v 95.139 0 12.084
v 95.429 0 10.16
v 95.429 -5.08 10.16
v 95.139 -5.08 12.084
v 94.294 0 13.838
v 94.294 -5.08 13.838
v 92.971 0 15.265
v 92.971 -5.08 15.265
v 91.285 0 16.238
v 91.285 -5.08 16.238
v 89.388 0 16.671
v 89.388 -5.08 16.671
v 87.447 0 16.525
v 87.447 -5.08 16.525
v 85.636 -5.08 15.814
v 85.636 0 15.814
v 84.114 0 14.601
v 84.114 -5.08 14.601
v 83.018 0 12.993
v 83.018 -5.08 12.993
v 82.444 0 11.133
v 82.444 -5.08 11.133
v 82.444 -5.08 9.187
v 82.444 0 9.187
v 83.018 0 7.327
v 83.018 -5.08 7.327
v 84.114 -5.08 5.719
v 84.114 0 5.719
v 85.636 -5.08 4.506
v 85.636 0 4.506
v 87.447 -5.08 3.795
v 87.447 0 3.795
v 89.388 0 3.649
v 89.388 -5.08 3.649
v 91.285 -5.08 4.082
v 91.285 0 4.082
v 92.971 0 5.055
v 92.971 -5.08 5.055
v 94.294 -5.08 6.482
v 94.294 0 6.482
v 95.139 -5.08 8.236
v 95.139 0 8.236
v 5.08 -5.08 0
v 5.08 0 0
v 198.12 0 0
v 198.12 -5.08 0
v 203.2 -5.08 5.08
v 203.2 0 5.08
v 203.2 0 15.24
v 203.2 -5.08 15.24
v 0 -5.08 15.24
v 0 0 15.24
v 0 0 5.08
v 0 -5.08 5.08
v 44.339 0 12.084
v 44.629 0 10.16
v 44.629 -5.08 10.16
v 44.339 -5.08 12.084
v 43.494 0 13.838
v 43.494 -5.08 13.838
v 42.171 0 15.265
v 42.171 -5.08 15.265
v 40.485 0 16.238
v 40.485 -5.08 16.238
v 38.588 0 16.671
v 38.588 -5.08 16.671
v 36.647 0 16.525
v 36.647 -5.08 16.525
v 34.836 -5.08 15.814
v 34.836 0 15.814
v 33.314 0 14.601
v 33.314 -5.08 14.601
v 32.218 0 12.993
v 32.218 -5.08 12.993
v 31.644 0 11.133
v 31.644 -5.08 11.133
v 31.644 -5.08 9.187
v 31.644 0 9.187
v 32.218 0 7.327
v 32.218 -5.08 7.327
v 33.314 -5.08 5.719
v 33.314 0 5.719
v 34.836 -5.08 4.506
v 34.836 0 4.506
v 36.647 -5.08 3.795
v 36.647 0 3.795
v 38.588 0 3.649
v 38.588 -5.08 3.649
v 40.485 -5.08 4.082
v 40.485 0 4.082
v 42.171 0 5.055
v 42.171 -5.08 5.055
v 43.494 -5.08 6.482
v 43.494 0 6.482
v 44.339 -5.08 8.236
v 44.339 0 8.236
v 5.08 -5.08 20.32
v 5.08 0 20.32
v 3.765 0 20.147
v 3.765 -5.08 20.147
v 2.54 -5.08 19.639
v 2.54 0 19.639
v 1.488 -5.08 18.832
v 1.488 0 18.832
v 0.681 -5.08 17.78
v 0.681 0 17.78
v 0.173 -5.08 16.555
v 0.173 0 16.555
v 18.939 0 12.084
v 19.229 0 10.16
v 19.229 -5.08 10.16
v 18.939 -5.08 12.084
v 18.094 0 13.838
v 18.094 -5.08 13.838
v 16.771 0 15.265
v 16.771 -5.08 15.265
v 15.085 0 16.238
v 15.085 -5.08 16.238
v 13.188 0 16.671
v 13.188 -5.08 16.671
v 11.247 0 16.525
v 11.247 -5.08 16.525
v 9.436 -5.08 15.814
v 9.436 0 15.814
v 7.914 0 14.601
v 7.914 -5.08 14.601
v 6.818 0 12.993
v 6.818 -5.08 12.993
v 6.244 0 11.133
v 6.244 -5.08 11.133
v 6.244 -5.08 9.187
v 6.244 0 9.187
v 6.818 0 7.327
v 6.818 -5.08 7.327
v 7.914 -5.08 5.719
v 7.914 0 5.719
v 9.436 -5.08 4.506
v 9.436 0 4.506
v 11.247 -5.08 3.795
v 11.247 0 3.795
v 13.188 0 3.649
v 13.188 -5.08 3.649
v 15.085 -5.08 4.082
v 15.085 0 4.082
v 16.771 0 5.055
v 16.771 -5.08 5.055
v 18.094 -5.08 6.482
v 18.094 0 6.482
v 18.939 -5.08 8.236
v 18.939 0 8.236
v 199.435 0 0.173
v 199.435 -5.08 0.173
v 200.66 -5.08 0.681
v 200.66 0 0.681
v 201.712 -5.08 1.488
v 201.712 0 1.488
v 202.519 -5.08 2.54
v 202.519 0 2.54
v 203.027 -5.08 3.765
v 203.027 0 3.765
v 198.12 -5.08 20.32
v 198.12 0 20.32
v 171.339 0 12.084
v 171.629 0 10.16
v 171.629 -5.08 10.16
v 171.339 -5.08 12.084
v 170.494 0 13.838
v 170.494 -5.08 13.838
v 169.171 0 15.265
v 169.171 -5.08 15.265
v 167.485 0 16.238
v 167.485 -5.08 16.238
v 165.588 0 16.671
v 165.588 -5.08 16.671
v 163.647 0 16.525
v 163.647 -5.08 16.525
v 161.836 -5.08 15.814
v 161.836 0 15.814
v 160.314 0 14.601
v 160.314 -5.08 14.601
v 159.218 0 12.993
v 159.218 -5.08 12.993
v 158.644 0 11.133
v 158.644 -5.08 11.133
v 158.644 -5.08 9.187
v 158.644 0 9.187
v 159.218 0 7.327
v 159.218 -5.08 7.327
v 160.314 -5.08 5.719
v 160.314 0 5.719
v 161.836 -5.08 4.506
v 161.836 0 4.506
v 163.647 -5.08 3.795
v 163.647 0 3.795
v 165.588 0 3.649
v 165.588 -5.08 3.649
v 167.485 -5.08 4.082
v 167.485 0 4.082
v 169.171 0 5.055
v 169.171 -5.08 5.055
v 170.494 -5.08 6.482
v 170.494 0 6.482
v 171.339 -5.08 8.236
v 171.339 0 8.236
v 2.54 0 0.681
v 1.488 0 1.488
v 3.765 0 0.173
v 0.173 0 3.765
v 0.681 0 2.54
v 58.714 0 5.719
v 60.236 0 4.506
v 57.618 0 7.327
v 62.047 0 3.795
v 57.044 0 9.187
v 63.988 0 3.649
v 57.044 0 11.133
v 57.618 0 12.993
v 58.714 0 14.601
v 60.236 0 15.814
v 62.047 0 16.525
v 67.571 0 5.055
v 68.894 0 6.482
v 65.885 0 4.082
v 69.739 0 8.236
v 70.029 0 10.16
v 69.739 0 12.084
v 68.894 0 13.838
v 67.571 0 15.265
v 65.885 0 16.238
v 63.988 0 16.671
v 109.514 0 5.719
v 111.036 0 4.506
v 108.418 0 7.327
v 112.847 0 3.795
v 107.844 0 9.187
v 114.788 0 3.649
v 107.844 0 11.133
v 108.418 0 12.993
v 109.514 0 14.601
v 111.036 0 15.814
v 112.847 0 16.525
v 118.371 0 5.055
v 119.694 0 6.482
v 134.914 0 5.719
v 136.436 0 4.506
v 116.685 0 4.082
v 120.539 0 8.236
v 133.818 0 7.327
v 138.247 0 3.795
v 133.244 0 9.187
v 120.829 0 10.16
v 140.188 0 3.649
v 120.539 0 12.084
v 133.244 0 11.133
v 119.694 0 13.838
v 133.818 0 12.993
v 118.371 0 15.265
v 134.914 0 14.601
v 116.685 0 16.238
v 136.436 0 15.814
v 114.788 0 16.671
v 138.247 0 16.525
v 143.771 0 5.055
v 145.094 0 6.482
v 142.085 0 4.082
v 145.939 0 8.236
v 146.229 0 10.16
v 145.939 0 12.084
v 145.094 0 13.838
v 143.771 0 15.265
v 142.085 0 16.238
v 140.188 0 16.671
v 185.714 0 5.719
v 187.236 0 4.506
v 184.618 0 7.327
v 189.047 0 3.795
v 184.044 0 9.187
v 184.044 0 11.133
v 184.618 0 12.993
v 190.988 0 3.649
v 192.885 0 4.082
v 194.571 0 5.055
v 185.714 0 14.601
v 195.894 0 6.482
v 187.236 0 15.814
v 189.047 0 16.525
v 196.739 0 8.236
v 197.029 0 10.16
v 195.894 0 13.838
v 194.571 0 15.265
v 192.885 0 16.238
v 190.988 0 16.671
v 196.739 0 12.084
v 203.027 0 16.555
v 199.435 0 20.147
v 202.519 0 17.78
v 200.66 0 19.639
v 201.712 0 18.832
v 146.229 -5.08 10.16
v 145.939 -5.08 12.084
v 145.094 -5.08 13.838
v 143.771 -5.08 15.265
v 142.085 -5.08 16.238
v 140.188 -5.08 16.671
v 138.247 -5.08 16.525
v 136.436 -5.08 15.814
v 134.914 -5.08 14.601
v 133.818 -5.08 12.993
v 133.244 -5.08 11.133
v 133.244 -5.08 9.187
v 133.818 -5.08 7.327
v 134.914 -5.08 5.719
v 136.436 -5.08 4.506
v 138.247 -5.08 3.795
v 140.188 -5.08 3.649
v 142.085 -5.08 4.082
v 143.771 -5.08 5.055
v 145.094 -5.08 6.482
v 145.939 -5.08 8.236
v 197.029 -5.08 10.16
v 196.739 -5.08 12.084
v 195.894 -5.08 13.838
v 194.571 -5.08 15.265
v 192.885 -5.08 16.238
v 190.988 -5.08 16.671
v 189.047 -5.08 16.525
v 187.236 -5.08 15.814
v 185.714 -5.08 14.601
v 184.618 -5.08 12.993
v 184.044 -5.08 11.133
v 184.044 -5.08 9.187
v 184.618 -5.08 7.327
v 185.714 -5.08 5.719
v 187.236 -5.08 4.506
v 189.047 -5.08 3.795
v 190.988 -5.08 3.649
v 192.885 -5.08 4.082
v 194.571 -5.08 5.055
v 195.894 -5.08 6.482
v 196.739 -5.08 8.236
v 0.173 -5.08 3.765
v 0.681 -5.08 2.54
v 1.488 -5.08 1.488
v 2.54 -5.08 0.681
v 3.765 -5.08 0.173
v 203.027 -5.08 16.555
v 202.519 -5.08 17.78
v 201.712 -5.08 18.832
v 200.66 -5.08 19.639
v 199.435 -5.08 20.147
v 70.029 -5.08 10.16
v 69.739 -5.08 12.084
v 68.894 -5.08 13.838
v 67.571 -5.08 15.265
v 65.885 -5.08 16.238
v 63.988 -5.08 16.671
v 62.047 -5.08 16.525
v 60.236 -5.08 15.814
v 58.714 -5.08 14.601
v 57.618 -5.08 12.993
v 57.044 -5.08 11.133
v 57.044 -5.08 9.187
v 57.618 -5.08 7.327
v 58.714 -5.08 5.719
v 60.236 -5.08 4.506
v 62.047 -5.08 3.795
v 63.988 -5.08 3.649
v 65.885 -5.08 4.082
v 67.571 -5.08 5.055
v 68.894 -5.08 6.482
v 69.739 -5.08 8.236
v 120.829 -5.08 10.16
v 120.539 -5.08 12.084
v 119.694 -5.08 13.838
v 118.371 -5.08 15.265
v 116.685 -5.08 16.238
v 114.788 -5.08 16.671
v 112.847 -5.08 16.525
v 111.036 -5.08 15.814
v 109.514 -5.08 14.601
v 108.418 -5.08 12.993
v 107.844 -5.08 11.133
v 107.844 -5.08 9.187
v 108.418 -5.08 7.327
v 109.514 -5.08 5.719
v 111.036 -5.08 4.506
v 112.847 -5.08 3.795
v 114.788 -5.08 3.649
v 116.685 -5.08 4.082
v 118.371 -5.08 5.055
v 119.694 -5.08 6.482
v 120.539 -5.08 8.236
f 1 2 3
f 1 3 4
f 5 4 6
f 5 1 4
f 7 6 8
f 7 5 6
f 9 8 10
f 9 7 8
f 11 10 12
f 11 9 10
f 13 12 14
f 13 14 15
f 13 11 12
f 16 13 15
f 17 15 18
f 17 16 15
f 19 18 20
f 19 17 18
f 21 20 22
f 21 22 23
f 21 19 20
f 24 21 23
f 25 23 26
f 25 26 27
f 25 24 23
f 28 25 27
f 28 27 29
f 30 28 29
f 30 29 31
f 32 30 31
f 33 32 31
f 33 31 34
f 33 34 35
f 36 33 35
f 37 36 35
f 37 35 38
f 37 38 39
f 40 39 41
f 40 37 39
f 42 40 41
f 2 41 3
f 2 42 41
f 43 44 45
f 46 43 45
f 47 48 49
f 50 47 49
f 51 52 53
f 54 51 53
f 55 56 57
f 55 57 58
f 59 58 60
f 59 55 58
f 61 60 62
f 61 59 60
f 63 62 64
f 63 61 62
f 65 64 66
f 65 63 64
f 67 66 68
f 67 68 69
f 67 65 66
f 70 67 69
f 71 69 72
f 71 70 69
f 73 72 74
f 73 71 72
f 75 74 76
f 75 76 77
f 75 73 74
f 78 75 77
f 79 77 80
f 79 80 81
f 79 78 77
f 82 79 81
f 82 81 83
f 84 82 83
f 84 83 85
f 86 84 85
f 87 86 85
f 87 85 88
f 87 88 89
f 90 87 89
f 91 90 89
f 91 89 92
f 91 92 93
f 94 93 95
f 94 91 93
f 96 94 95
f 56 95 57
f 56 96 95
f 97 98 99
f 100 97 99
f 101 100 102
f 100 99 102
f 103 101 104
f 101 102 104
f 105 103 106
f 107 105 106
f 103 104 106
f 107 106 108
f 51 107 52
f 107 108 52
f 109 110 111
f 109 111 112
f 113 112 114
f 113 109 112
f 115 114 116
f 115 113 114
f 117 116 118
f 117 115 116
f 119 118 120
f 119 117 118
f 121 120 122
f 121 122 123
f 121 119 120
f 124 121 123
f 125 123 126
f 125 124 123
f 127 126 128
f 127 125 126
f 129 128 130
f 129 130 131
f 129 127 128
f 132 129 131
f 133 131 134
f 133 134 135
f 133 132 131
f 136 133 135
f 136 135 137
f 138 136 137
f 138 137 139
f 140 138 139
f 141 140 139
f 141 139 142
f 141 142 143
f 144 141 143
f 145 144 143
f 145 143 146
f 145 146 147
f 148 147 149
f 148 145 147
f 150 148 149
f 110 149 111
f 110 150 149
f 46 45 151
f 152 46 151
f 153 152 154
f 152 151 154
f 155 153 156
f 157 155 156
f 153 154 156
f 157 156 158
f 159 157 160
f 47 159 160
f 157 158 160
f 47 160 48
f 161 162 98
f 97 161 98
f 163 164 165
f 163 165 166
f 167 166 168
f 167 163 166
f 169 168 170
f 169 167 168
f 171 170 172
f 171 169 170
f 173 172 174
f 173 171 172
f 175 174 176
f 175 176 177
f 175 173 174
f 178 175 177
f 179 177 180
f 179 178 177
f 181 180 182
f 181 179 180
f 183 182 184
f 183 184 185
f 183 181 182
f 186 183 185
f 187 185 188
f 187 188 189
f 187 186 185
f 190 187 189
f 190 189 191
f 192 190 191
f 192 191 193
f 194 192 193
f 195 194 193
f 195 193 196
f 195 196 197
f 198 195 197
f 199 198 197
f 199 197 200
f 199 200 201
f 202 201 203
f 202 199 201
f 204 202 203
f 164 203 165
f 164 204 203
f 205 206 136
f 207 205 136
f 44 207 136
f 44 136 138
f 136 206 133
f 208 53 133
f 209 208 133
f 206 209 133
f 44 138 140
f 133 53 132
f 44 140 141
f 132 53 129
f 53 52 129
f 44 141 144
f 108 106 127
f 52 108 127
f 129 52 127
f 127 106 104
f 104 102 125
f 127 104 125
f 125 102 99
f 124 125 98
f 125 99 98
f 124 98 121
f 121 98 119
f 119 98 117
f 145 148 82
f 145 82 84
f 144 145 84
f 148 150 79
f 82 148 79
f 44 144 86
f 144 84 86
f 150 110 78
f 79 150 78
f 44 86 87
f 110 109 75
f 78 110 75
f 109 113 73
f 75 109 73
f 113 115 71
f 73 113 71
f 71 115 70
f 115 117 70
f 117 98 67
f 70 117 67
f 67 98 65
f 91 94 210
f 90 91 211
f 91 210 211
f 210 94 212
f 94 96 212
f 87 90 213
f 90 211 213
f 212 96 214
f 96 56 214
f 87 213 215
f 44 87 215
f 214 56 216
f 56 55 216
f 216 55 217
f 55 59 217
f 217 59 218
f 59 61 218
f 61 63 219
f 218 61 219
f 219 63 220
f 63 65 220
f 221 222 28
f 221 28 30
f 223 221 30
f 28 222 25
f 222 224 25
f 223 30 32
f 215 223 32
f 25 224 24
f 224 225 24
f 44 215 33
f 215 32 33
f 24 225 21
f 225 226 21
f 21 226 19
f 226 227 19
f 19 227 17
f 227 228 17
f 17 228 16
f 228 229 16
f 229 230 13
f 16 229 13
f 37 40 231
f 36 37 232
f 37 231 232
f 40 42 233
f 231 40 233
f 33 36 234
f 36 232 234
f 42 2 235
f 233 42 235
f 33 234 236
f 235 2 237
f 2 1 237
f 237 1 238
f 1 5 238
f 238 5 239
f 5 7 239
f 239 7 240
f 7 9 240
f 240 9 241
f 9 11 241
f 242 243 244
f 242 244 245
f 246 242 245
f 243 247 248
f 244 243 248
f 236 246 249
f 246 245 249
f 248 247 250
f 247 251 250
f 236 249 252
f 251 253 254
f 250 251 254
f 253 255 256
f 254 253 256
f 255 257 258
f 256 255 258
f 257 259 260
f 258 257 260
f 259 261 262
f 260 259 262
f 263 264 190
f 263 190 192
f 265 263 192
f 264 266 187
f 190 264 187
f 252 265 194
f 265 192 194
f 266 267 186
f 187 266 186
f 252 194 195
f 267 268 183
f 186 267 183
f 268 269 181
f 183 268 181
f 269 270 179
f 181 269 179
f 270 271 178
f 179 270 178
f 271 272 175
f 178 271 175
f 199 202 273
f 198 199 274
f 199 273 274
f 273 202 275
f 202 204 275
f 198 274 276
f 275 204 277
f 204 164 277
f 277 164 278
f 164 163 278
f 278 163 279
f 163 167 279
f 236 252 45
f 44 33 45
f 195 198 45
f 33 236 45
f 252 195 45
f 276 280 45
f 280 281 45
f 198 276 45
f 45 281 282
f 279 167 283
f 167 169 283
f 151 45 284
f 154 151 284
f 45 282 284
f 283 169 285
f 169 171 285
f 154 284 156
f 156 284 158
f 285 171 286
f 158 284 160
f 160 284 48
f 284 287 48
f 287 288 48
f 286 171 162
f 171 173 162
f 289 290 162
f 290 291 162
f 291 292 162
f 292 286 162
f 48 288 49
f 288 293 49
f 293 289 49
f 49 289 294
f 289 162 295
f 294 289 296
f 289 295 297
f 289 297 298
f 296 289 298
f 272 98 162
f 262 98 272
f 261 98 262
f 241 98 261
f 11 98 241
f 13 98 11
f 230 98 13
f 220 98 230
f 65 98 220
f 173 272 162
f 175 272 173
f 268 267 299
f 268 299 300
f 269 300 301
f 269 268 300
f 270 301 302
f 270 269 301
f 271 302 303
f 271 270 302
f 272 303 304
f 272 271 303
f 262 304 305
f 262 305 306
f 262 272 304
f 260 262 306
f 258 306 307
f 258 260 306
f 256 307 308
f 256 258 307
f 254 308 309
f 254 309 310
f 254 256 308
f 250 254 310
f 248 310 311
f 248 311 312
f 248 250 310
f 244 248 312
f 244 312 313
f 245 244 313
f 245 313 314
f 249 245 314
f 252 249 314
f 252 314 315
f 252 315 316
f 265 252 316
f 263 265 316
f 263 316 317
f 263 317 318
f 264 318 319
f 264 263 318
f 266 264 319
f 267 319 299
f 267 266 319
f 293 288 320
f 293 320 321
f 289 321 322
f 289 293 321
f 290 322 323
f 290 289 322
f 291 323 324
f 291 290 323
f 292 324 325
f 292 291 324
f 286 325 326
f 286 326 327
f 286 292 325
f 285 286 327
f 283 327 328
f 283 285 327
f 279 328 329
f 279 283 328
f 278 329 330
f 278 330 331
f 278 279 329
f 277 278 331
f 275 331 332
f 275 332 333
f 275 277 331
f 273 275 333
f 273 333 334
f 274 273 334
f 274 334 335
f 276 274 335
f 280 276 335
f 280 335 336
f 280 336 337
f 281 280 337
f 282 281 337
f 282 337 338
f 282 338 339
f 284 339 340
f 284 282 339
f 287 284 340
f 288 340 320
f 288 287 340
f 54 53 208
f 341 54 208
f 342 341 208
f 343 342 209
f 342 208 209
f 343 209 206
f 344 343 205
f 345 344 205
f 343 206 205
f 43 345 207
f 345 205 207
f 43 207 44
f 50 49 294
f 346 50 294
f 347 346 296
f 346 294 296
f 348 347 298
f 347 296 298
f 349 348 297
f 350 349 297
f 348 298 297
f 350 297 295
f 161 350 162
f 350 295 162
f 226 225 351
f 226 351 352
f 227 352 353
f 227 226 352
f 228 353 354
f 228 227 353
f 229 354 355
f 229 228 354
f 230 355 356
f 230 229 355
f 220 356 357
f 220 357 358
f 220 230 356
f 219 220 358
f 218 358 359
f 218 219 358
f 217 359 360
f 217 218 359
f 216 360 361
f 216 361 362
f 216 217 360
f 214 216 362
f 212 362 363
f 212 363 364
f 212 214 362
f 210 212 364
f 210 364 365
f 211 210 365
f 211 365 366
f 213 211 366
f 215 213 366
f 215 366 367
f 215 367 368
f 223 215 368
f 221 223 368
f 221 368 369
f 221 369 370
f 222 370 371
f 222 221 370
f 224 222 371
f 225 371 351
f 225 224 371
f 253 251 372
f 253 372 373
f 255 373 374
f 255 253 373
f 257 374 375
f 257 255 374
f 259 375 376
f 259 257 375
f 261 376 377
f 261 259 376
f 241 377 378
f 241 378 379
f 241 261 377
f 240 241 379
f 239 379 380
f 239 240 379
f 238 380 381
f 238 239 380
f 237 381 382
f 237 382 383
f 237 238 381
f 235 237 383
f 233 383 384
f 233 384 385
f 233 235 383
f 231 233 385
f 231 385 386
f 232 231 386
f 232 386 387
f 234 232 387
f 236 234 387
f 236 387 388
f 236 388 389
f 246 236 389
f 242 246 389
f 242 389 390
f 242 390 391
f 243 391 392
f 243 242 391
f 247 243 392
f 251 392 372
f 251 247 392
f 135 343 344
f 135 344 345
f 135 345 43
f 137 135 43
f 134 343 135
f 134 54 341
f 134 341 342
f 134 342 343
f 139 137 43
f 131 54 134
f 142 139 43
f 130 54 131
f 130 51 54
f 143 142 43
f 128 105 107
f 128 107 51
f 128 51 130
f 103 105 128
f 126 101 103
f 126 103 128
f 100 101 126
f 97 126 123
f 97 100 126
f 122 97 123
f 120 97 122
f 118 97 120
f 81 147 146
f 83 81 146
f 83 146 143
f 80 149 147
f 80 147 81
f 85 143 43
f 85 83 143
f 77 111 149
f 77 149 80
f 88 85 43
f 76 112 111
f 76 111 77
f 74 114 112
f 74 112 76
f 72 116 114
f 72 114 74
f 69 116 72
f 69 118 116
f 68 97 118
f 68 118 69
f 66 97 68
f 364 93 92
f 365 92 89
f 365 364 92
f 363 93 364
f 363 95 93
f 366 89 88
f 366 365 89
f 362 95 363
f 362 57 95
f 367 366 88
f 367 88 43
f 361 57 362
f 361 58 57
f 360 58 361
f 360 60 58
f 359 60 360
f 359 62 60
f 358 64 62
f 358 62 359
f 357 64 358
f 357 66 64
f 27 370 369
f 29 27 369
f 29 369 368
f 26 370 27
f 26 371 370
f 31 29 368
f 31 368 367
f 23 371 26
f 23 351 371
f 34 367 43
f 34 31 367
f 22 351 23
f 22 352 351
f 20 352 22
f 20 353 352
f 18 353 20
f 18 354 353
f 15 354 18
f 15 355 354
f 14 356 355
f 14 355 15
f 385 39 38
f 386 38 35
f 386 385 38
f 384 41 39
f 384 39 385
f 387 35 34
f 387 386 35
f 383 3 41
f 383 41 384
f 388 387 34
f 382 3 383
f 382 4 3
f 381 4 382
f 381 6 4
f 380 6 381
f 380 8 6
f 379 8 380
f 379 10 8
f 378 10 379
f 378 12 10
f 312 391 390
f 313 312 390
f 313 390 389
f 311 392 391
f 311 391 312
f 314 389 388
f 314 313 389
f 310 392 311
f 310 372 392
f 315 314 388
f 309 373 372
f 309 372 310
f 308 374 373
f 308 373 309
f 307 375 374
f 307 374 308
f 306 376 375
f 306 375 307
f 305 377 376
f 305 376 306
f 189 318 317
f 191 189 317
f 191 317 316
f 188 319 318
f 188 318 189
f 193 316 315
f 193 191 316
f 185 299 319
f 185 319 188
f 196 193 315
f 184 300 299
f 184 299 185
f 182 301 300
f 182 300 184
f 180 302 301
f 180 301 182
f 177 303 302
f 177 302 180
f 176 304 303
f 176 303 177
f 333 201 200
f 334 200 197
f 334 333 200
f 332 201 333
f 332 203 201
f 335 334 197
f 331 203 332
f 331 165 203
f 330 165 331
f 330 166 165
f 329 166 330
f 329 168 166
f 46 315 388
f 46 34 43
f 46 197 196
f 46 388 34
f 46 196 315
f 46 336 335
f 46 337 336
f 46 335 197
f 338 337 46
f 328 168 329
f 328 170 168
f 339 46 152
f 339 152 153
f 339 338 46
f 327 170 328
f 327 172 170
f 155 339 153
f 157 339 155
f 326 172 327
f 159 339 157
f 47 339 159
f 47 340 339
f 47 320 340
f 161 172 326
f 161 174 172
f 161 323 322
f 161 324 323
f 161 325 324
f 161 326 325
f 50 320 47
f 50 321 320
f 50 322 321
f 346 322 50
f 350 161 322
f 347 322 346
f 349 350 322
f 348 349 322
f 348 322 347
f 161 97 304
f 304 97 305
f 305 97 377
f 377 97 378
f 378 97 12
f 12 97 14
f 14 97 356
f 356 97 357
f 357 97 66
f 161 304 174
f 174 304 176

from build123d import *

# Parameters (mm, degrees)
F0_R     = 6.528915
F1_DEPTH = 5.08


with BuildPart() as f1:
    # F0 (on Front) → F1 (new body)
    with BuildSketch(Plane.XZ):
        with BuildLine():
            ThreePointArc((0, 5.08), (1.487898, 1.487898), (5.08, 0))
            Line((5.08, 0), (198.12, 0))
            ThreePointArc((198.12, 0), (201.712102, 1.487898), (203.2, 5.08))
            Line((203.2, 5.08), (203.2, 15.24))
            ThreePointArc((203.2, 15.24), (201.712102, 18.832102), (198.12, 20.32))
            Line((198.12, 20.32), (5.08, 20.32))
            ThreePointArc((5.08, 20.32), (1.487898, 18.832102), (0, 15.24))
            Line((0, 15.24), (0, 5.08))
        make_face()
        with Locations((12.7, 10.16)):
            Circle(F0_R, mode=Mode.SUBTRACT)
        with Locations((38.1, 10.16)):
            Circle(F0_R, mode=Mode.SUBTRACT)
        with Locations((63.5, 10.16)):
            Circle(F0_R, mode=Mode.SUBTRACT)
        with Locations((88.9, 10.16)):
            Circle(F0_R, mode=Mode.SUBTRACT)
        with Locations((114.3, 10.16)):
            Circle(F0_R, mode=Mode.SUBTRACT)
        with Locations((139.7, 10.16)):
            Circle(F0_R, mode=Mode.SUBTRACT)
        with Locations((165.1, 10.16)):
            Circle(F0_R, mode=Mode.SUBTRACT)
        with Locations((190.5, 10.16)):
            Circle(F0_R, mode=Mode.SUBTRACT)
    extrude(amount=F1_DEPTH)


solid = f1.part
